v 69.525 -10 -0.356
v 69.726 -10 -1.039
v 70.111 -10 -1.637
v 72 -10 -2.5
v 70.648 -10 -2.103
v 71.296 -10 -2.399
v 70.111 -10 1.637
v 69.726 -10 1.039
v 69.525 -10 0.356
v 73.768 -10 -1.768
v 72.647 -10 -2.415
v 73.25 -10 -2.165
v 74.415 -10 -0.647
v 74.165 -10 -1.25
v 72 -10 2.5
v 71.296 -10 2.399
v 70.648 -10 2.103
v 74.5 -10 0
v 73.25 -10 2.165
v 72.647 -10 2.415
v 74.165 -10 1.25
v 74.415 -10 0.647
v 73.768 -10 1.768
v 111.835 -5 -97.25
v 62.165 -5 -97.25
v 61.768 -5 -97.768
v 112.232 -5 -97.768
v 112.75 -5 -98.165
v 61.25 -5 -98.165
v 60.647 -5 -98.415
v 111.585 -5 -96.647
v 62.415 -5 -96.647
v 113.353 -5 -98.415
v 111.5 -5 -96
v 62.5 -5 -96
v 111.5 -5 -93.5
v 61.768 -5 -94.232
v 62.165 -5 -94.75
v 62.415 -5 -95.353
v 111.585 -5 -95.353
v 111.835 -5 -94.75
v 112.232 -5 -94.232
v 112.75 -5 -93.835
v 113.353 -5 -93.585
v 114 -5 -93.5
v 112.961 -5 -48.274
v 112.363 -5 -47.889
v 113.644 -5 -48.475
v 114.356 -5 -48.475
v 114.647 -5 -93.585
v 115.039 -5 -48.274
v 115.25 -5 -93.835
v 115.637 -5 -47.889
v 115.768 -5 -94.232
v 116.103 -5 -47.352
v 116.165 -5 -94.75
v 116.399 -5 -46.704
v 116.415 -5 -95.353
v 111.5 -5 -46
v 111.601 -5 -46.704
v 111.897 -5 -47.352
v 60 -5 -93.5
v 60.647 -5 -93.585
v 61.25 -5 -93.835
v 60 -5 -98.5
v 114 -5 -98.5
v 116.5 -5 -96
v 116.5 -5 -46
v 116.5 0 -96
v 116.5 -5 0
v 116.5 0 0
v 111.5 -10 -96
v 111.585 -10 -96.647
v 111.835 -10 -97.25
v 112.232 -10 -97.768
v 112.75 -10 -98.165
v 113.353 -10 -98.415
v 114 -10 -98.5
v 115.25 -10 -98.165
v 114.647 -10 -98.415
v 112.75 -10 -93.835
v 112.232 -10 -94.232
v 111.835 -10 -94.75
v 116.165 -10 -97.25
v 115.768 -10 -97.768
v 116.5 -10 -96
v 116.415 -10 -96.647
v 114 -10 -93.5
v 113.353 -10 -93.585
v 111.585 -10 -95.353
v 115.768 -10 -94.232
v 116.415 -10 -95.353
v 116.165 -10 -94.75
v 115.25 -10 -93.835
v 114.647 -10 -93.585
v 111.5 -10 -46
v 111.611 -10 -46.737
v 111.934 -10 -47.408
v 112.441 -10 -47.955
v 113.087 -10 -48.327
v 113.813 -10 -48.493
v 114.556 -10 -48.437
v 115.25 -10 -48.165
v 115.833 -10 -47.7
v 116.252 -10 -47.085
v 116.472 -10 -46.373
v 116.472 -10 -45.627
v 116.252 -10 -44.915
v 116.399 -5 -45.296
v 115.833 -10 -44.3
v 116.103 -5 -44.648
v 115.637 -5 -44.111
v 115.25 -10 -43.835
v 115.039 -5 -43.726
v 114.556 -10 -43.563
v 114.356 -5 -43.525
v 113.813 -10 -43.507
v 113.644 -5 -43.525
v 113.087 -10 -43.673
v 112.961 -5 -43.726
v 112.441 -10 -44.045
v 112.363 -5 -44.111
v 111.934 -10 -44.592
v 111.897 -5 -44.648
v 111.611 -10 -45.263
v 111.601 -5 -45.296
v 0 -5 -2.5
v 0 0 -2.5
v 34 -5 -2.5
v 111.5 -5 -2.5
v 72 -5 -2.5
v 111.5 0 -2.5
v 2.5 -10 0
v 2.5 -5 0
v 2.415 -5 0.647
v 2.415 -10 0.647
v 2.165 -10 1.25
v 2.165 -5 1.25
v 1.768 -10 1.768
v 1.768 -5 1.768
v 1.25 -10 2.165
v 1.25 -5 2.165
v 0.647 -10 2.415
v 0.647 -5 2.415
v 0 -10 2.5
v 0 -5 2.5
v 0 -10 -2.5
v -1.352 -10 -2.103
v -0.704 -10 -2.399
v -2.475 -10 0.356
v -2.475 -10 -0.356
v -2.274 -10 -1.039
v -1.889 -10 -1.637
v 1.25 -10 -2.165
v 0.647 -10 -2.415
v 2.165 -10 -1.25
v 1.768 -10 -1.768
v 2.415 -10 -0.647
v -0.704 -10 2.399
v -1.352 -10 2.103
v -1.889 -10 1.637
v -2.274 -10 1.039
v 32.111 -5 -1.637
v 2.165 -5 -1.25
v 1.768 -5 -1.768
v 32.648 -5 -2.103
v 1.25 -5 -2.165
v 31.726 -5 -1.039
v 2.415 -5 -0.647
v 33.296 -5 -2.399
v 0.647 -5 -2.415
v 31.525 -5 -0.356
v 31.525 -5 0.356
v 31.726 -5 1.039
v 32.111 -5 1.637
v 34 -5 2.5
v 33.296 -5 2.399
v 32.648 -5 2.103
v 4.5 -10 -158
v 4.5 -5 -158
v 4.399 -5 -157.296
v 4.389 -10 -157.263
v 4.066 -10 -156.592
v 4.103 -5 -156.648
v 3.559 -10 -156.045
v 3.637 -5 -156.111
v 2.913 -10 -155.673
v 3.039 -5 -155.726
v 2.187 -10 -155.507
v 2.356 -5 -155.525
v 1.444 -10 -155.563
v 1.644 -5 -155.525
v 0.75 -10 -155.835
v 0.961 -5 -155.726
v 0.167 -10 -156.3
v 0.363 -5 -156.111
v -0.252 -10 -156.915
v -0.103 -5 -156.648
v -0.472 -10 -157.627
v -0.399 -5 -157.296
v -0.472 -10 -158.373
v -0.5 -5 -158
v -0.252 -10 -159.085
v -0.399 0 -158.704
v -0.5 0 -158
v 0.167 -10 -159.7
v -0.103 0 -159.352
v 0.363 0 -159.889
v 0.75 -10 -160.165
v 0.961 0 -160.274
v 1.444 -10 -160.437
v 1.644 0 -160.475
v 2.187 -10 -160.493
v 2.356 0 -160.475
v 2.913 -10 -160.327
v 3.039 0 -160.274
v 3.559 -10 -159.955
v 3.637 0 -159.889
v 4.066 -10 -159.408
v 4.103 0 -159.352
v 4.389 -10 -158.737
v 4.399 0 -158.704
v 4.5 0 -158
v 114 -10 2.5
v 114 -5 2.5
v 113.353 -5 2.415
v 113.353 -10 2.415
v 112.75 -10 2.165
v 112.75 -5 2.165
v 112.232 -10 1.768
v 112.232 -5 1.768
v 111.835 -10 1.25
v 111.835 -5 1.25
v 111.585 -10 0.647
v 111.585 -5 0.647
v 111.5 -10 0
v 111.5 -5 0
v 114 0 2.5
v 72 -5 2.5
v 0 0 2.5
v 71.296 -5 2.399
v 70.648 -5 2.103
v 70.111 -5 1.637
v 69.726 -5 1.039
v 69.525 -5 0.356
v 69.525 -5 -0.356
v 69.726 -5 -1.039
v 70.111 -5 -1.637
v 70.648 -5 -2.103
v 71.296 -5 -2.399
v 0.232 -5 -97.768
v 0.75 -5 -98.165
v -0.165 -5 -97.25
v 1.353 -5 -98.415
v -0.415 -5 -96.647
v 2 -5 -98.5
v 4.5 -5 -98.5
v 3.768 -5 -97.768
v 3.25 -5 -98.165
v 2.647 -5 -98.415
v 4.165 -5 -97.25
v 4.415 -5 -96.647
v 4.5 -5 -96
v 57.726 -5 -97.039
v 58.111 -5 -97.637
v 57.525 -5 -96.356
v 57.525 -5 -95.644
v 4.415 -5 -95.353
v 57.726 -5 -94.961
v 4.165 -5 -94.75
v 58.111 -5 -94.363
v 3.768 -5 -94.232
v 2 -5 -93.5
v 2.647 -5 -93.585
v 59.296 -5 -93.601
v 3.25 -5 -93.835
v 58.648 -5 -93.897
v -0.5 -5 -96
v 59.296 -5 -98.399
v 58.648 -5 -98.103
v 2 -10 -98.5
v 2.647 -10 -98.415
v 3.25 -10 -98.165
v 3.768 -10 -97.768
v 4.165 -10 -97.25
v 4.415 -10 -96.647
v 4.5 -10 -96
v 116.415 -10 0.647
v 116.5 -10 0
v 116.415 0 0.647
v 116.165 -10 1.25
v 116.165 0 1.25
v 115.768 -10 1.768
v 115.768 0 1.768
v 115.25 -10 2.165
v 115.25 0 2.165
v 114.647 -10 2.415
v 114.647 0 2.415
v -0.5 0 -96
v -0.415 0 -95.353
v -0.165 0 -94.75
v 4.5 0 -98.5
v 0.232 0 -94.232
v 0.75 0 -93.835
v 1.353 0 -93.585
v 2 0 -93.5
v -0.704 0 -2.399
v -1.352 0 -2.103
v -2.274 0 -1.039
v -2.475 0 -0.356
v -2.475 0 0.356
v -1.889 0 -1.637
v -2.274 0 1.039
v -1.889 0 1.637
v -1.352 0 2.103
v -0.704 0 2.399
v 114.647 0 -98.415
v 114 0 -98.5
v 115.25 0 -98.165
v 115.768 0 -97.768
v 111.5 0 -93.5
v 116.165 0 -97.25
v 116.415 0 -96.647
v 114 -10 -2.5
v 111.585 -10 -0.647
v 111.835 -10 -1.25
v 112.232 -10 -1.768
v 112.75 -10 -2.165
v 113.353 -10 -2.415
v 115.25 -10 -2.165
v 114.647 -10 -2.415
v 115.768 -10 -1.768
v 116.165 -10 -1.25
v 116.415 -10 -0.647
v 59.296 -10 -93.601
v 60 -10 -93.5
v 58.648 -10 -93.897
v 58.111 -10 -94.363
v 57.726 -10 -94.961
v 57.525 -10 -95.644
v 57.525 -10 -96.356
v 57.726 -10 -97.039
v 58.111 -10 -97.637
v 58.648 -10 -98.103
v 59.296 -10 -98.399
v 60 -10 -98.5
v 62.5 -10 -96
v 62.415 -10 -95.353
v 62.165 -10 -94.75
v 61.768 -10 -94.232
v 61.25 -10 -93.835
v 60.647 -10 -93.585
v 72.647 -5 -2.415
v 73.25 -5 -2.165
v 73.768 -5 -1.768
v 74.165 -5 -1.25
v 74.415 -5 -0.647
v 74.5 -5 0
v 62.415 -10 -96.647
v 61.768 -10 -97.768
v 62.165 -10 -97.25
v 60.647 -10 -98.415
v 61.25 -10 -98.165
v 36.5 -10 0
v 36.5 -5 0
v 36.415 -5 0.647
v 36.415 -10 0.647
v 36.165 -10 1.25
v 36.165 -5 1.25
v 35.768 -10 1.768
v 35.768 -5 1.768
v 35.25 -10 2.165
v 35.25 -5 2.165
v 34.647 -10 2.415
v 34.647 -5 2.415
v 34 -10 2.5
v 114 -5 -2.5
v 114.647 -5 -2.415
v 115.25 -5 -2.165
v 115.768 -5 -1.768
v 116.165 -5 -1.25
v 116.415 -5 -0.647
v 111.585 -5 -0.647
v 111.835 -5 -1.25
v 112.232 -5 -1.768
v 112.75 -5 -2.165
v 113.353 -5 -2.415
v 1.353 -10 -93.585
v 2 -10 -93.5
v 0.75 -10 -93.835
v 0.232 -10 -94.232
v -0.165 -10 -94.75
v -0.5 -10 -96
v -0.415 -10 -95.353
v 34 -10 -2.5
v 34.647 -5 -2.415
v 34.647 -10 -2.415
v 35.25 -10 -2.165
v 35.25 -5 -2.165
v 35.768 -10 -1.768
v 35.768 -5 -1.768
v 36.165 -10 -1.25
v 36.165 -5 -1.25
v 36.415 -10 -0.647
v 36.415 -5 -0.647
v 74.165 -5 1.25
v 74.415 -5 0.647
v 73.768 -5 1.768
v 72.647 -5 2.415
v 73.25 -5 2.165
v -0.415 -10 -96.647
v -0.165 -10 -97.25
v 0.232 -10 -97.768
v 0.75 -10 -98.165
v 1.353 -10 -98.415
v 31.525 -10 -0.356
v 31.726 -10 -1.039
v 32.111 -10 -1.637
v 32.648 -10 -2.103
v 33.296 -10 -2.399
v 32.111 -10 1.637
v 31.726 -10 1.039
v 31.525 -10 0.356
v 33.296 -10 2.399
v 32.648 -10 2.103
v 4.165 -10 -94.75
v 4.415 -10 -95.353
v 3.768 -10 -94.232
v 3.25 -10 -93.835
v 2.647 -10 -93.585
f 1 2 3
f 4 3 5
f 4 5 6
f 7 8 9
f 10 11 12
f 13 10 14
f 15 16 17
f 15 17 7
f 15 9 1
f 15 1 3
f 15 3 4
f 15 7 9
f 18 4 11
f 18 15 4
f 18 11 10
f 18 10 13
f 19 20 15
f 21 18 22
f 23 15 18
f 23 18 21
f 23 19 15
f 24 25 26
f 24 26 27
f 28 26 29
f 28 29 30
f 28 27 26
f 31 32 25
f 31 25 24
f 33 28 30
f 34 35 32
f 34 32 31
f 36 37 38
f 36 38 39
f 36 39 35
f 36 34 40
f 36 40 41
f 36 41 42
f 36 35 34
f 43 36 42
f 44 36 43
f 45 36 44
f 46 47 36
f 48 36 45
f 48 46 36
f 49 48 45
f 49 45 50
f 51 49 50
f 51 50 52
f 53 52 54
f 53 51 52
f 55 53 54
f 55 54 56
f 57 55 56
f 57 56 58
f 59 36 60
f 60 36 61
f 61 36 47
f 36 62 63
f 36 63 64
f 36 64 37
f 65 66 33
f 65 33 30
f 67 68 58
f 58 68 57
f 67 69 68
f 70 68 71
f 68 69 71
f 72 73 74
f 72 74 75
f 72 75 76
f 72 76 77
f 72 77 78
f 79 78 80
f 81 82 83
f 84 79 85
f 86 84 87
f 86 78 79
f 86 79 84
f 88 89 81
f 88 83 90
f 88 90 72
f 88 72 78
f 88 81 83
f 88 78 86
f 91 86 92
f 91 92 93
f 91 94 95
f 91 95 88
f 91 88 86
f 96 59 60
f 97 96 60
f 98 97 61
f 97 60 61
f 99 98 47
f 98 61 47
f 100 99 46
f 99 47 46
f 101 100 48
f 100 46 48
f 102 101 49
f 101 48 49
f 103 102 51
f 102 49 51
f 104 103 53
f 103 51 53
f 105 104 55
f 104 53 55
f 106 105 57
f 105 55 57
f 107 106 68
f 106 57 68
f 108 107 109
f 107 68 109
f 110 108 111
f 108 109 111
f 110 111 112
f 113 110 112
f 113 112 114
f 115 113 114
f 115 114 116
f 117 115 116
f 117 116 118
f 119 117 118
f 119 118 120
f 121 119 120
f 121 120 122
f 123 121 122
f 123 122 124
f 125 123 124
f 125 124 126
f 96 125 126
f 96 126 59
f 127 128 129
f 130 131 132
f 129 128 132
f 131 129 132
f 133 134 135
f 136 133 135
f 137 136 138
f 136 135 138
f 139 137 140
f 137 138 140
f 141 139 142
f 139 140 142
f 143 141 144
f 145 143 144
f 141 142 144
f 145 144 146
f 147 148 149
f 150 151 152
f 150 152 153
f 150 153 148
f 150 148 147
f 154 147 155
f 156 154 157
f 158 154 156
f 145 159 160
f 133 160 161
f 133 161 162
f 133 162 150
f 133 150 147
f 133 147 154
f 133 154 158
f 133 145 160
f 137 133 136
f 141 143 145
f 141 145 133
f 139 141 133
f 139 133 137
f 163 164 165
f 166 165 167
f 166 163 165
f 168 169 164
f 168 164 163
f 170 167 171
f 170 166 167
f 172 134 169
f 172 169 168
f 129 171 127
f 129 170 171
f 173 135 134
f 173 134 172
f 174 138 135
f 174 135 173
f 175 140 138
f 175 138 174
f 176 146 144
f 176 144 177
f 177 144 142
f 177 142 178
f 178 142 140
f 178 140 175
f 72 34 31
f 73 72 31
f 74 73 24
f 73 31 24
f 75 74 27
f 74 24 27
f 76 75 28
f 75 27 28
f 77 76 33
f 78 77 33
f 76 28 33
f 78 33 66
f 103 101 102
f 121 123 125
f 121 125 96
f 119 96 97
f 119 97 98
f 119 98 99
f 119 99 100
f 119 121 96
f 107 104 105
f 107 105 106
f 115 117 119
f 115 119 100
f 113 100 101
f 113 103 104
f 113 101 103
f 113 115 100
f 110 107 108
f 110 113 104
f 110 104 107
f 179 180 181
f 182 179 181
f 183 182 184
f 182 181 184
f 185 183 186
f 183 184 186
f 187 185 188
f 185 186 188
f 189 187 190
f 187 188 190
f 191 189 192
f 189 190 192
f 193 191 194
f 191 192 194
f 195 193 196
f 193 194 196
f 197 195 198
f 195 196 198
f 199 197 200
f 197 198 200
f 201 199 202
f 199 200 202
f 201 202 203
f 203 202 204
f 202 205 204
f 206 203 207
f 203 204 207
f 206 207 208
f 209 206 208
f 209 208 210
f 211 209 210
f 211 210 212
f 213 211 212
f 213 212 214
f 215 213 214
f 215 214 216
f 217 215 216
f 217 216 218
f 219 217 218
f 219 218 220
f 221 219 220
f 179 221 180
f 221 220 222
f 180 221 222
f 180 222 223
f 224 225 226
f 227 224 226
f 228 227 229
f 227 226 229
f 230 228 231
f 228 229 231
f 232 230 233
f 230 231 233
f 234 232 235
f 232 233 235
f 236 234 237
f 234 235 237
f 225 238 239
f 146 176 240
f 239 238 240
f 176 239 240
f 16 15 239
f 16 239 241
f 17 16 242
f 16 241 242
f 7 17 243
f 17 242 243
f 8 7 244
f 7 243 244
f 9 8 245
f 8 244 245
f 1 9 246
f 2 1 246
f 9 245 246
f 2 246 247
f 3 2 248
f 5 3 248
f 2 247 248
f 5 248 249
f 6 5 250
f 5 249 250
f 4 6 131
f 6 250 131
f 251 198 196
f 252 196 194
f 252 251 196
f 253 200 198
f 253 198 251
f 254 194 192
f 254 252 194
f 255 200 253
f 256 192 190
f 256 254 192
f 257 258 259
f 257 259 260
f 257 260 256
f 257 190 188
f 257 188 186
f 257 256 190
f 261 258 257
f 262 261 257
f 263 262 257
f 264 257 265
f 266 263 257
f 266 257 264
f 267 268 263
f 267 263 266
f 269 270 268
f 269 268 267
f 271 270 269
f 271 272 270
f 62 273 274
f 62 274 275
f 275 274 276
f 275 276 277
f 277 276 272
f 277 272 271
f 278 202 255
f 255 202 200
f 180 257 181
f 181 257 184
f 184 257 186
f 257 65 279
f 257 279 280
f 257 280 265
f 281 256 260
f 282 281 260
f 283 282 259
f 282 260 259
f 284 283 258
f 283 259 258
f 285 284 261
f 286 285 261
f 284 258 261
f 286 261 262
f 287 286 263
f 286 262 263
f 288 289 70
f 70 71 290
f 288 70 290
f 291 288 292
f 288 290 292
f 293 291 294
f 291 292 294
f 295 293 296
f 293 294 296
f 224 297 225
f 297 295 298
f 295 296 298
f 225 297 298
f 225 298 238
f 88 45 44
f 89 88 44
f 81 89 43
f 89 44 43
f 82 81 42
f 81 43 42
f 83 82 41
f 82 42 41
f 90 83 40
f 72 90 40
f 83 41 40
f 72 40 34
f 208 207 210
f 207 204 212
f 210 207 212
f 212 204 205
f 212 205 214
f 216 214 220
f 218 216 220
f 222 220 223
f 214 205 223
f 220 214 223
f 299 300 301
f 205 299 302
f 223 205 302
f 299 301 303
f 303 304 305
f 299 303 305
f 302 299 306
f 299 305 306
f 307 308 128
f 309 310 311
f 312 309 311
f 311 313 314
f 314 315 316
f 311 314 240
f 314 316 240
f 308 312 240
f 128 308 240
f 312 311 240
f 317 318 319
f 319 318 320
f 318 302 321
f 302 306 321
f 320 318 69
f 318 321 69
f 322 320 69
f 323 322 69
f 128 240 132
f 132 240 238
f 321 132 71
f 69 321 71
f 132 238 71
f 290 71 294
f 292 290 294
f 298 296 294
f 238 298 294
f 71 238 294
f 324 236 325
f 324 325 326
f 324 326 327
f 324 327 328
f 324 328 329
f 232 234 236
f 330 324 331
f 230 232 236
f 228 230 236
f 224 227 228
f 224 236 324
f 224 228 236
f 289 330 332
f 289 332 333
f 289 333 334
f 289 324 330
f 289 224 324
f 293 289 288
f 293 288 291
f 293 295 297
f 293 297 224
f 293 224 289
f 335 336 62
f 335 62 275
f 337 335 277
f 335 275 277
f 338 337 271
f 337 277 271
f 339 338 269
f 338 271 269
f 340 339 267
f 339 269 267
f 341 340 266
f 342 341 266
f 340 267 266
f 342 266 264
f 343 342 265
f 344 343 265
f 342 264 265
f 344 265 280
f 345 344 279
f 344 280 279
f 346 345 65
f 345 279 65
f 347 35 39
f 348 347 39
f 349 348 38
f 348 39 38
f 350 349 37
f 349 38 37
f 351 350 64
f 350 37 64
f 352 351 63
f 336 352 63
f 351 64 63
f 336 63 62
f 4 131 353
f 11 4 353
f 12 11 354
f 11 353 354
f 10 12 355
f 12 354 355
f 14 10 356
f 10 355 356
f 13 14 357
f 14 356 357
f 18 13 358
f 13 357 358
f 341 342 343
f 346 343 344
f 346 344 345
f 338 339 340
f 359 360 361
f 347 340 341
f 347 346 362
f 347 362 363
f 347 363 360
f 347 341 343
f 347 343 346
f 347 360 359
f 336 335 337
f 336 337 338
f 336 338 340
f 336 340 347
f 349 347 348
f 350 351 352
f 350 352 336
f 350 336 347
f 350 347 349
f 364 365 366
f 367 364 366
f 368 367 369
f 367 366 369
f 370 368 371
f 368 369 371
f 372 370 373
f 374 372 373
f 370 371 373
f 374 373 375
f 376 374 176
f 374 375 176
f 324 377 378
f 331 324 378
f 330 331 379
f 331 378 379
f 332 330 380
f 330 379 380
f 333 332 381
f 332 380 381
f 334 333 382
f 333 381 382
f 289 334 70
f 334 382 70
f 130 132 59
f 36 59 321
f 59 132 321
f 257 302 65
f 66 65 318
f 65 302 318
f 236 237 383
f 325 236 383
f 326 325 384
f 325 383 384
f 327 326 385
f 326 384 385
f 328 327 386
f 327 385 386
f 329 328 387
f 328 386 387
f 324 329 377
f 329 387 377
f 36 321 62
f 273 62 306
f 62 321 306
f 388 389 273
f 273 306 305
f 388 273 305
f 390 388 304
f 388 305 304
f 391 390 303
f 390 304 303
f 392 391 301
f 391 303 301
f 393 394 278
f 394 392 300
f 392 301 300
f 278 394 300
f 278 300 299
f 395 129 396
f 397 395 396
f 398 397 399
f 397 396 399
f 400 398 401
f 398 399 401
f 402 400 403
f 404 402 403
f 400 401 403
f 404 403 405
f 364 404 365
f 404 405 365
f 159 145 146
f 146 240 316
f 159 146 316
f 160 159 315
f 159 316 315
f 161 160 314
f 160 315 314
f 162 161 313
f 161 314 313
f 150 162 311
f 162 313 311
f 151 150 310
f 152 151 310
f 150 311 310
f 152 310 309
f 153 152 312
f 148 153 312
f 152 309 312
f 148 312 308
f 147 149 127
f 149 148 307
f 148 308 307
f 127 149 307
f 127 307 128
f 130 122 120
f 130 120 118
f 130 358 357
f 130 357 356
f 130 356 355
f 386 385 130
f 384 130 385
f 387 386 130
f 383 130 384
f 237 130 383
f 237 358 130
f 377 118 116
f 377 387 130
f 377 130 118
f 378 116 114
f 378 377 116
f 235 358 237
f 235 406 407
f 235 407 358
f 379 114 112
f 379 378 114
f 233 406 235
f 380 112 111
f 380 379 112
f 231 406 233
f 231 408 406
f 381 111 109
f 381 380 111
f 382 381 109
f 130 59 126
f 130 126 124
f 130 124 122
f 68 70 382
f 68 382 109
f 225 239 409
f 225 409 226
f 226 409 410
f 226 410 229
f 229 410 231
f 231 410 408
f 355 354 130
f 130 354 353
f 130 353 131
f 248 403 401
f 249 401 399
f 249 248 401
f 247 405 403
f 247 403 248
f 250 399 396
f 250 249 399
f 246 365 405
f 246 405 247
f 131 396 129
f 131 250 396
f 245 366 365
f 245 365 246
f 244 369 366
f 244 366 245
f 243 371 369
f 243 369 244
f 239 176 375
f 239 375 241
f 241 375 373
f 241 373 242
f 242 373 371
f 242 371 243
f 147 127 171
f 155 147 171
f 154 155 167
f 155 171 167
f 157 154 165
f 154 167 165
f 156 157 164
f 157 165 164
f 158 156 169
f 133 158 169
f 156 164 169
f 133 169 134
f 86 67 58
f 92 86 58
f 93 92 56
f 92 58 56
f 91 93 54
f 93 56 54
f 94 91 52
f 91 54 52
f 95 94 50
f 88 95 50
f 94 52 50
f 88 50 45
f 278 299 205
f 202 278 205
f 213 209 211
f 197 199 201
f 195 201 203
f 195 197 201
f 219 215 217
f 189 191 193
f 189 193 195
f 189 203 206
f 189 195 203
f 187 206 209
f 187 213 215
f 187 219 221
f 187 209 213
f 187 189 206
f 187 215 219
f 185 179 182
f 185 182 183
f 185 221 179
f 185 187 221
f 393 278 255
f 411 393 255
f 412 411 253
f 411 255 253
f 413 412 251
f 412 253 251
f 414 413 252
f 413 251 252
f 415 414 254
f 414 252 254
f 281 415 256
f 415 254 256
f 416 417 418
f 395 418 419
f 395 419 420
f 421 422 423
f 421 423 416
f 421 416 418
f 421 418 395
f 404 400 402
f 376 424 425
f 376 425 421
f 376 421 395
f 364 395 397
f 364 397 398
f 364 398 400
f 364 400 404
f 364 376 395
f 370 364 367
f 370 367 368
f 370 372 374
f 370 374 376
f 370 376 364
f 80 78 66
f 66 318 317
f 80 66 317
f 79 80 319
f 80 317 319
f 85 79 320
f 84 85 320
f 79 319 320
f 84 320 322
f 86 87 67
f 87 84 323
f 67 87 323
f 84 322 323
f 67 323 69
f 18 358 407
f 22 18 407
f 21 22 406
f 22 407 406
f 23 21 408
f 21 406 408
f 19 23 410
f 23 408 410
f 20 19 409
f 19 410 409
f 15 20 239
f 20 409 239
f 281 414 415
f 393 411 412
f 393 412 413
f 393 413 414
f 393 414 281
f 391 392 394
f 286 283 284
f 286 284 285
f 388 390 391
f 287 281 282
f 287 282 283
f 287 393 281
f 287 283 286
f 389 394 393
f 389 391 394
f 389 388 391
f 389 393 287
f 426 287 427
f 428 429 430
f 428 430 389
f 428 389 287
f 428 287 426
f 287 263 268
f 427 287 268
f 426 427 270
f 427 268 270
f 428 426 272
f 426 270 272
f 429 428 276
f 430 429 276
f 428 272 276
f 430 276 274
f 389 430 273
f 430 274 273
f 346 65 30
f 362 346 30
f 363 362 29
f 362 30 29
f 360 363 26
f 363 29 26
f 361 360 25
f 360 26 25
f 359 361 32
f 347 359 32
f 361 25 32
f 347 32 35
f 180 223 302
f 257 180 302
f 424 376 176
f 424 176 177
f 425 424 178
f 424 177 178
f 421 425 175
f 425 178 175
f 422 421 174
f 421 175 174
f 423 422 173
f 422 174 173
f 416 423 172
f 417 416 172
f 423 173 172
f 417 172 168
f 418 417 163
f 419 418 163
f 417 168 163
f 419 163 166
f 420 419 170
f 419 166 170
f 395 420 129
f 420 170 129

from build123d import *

# Parameters (mm, degrees)
F1_DEPTH = 10
F2_DEPTH = 5


with BuildPart() as f1:
    # F0 (on Front) → F1 (new body)
    with BuildSketch(Plane.XZ):
        with BuildLine():
            ThreePointArc((0, -2.5), (1.767766953, -1.767766953), (2.5, 0))
            ThreePointArc((2.5, 0), (1.767766953, 1.767766953), (0, 2.5))
            Line((0, 2.5), (0, -2.5))
        make_face()
        with BuildLine():
            Line((0, -2.5), (0, 2.5))
            ThreePointArc((0, 2.5), (-2.5, 0), (0, -2.5))
        make_face()
    extrude(amount=F1_DEPTH)



with BuildPart() as f1b:
    # F0 (on Front) → F1, piece 2 (new body)
    with BuildSketch(Plane.XZ):
        with BuildLine():
            ThreePointArc((36.5, 0), (35.767766953, 1.767766953), (34, 2.5))
            Line((34, 2.5), (34, -2.5))
            ThreePointArc((34, -2.5), (35.767766953, -1.767766953), (36.5, 0))
        make_face()
        with BuildLine():
            Line((34, -2.5), (34, 2.5))
            ThreePointArc((34, 2.5), (31.5, 0), (34, -2.5))
        make_face()
    extrude(amount=F1_DEPTH)


with BuildPart() as f1c:
    # F0 (on Front) → F1, piece 3 (new body)
    with BuildSketch(Plane.XZ):
        with BuildLine():
            ThreePointArc((114, -2.5), (115.767766953, -1.767766953), (116.5, 0))
            Line((116.5, 0), (114, 0))
            Line((114, 0), (114, -2.5))
        make_face()
        with BuildLine():
            ThreePointArc((116.5, 0), (115.767766953, 1.767766953), (114, 2.5))
            Line((114, 2.5), (114, 0))
            Line((114, 0), (116.5, 0))
        make_face()
        with BuildLine():
            Line((114, 0), (114, 2.5))
            ThreePointArc((114, 2.5), (112.232233047, 1.767766953), (111.5, 0))
            Line((111.5, 0), (114, 0))
        make_face()
        with BuildLine():
            Line((114, 0), (111.5, 0))
            ThreePointArc((111.5, 0), (112.232233047, -1.767766953), (114, -2.5))
            Line((114, -2.5), (114, 0))
        make_face()
    extrude(amount=F1_DEPTH)


with BuildPart() as f1d:
    # F0 (on Front) → F1, piece 4 (new body)
    with BuildSketch(Plane.XZ):
        with BuildLine():
            Line((72, -2.5), (72, 2.5))
            ThreePointArc((72, 2.5), (69.5, 0), (72, -2.5))
        make_face()
        with BuildLine():
            ThreePointArc((74.5, 0), (73.767766953, 1.767766953), (72, 2.5))
            Line((72, 2.5), (72, -2.5))
            ThreePointArc((72, -2.5), (73.767766953, -1.767766953), (74.5, 0))
        make_face()
    extrude(amount=F1_DEPTH)


with BuildPart() as f1e:
    # F0 (on Front) → F1, piece 5 (new body)
    with BuildSketch(Plane.XZ):
        with BuildLine():
            ThreePointArc((116.5, -46), (114, -43.5), (111.5, -46))
            ThreePointArc((111.5, -46), (114, -48.5), (116.5, -46))
        make_face()
    extrude(amount=F1_DEPTH)


with BuildPart() as f1f:
    # F0 (on Front) → F1, piece 6 (new body)
    with BuildSketch(Plane.XZ):
        with BuildLine():
            Line((114, -96), (116.5, -96))
            ThreePointArc((116.5, -96), (115.767766953, -94.232233047), (114, -93.5))
            Line((114, -93.5), (114, -96))
        make_face()
        with BuildLine():
            Line((114, -96), (111.5, -96))
            ThreePointArc((111.5, -96), (112.232233047, -97.767766953), (114, -98.5))
            Line((114, -98.5), (114, -96))
        make_face()
        with BuildLine():
            ThreePointArc((114, -98.5), (115.767766953, -97.767766953), (116.5, -96))
            Line((116.5, -96), (114, -96))
            Line((114, -96), (114, -98.5))
        make_face()
        with BuildLine():
            Line((114, -96), (114, -93.5))
            ThreePointArc((114, -93.5), (112.232233047, -94.232233047), (111.5, -96))
            Line((111.5, -96), (114, -96))
        make_face()
    extrude(amount=F1_DEPTH)


with BuildPart() as f1g:
    # F0 (on Front) → F1, piece 7 (new body)
    with BuildSketch(Plane.XZ):
        with BuildLine():
            ThreePointArc((62.5, -96), (61.767766953, -94.232233047), (60, -93.5))
            Line((60, -93.5), (60, -98.5))
            ThreePointArc((60, -98.5), (61.767766953, -97.767766953), (62.5, -96))
        make_face()
        with BuildLine():
            Line((60, -98.5), (60, -93.5))
            ThreePointArc((60, -93.5), (57.5, -96), (60, -98.5))
        make_face()
    extrude(amount=F1_DEPTH)


with BuildPart() as f1h:
    # F0 (on Front) → F1, piece 8 (new body)
    with BuildSketch(Plane.XZ):
        with BuildLine():
            ThreePointArc((2, -98.5), (3.767766953, -97.767766953), (4.5, -96))
            Line((4.5, -96), (2, -96))
            Line((2, -96), (2, -98.5))
        make_face()
        with BuildLine():
            Line((2, -96), (-0.5, -96))
            ThreePointArc((-0.5, -96), (0.232233047, -97.767766953), (2, -98.5))
            Line((2, -98.5), (2, -96))
        make_face()
        with BuildLine():
            Line((2, -96), (2, -93.5))
            ThreePointArc((2, -93.5), (0.232233047, -94.232233047), (-0.5, -96))
            Line((-0.5, -96), (2, -96))
        make_face()
        with BuildLine():
            ThreePointArc((4.5, -96), (3.767766953, -94.232233047), (2, -93.5))
            Line((2, -93.5), (2, -96))
            Line((2, -96), (4.5, -96))
        make_face()
    extrude(amount=F1_DEPTH)


with BuildPart() as f1i:
    # F0 (on Front) → F1, piece 9 (new body)
    with BuildSketch(Plane.XZ):
        with BuildLine():
            ThreePointArc((-0.5, -158), (2, -160.5), (4.5, -158))
            Line((4.5, -158), (-0.5, -158))
        make_face()
        with BuildLine():
            Line((-0.5, -158), (4.5, -158))
            ThreePointArc((4.5, -158), (2, -155.5), (-0.5, -158))
        make_face()
    extrude(amount=F1_DEPTH)


with BuildPart() as f1_1:
    add(f1.part)

    add(f1b.part)  # F2 merges F1b

    add(f1c.part)  # F2 merges F1c

    add(f1d.part)  # F2 merges F1d

    add(f1e.part)  # F2 merges F1e

    add(f1f.part)  # F2 merges F1f

    add(f1g.part)  # F2 merges F1g

    add(f1h.part)  # F2 merges F1h

    add(f1i.part)  # F2 merges F1i
    # F0 (on Front) → F2 (join)
    with BuildSketch(Plane.XZ):
        with BuildLine():
            ThreePointArc((0, 2.5), (1.767766953, 1.767766953), (2.5, 0))
            ThreePointArc((2.5, 0), (1.767766953, -1.767766953), (0, -2.5))
            Line((0, -2.5), (34, -2.5))
            ThreePointArc((34, -2.5), (31.5, 0), (34, 2.5))
            Line((34, 2.5), (0, 2.5))
        make_face()
        with BuildLine():
            Line((72, 2.5), (34, 2.5))
            ThreePointArc((34, 2.5), (35.767766953, 1.767766953), (36.5, 0))
            ThreePointArc((36.5, 0), (35.767766953, -1.767766953), (34, -2.5))
            Line((34, -2.5), (72, -2.5))
            ThreePointArc((72, -2.5), (69.5, 0), (72, 2.5))
        make_face()
        with BuildLine():
            Line((114, -2.5), (111.5, -2.5))
            Line((111.5, -2.5), (111.5, -46))
            ThreePointArc((111.5, -46), (114, -43.5), (116.5, -46))
            Line((116.5, -46), (116.5, 0))
            ThreePointArc((116.5, 0), (115.767766953, -1.767766953), (114, -2.5))
        make_face()
        with BuildLine():
            Line((114, 2.5), (72, 2.5))
            ThreePointArc((72, 2.5), (73.767766953, 1.767766953), (74.5, 0))
            ThreePointArc((74.5, 0), (73.767766953, -1.767766953), (72, -2.5))
            Line((72, -2.5), (111.5, -2.5))
            Line((111.5, -2.5), (111.5, 0))
            ThreePointArc((111.5, 0), (112.232233047, 1.767766953), (114, 2.5))
        make_face()
        with BuildLine():
            ThreePointArc((116.5, -46), (114, -48.5), (111.5, -46))
            Line((111.5, -46), (111.5, -93.5))
            Line((111.5, -93.5), (114, -93.5))
            ThreePointArc((114, -93.5), (115.767766953, -94.232233047), (116.5, -96))
            Line((116.5, -96), (116.5, -46))
        make_face()
        with BuildLine():
            Line((111.5, -96), (111.5, -93.5))
            Line((111.5, -93.5), (60, -93.5))
            ThreePointArc((60, -93.5), (61.767766953, -94.232233047), (62.5, -96))
            ThreePointArc((62.5, -96), (61.767766953, -97.767766953), (60, -98.5))
            Line((60, -98.5), (114, -98.5))
            ThreePointArc((114, -98.5), (112.232233047, -97.767766953), (111.5, -96))
        make_face()
        with BuildLine():
            ThreePointArc((60, -98.5), (57.5, -96), (60, -93.5))
            Line((60, -93.5), (2, -93.5))
            ThreePointArc((2, -93.5), (3.767766953, -94.232233047), (4.5, -96))
            Line((4.5, -96), (4.5, -98.5))
            Line((4.5, -98.5), (60, -98.5))
        make_face()
        with BuildLine():
            Line((4.5, -158), (4.5, -98.5))
            Line((4.5, -98.5), (2, -98.5))
            ThreePointArc((2, -98.5), (0.232233047, -97.767766953), (-0.5, -96))
            Line((-0.5, -96), (-0.5, -158))
            ThreePointArc((-0.5, -158), (2, -155.5), (4.5, -158))
        make_face()
        with BuildLine():
            Line((2, -98.5), (4.5, -98.5))
            Line((4.5, -98.5), (4.5, -96))
            ThreePointArc((4.5, -96), (3.767766953, -97.767766953), (2, -98.5))
        make_face()
        with BuildLine():
            Line((111.5, 0), (111.5, -2.5))
            Line((111.5, -2.5), (114, -2.5))
            ThreePointArc((114, -2.5), (112.232233047, -1.767766953), (111.5, 0))
        make_face()
        with BuildLine():
            Line((114, -93.5), (111.5, -93.5))
            Line((111.5, -93.5), (111.5, -96))
            ThreePointArc((111.5, -96), (112.232233047, -94.232233047), (114, -93.5))
        make_face()
    extrude(amount=F2_DEPTH)


solid = f1_1.part
